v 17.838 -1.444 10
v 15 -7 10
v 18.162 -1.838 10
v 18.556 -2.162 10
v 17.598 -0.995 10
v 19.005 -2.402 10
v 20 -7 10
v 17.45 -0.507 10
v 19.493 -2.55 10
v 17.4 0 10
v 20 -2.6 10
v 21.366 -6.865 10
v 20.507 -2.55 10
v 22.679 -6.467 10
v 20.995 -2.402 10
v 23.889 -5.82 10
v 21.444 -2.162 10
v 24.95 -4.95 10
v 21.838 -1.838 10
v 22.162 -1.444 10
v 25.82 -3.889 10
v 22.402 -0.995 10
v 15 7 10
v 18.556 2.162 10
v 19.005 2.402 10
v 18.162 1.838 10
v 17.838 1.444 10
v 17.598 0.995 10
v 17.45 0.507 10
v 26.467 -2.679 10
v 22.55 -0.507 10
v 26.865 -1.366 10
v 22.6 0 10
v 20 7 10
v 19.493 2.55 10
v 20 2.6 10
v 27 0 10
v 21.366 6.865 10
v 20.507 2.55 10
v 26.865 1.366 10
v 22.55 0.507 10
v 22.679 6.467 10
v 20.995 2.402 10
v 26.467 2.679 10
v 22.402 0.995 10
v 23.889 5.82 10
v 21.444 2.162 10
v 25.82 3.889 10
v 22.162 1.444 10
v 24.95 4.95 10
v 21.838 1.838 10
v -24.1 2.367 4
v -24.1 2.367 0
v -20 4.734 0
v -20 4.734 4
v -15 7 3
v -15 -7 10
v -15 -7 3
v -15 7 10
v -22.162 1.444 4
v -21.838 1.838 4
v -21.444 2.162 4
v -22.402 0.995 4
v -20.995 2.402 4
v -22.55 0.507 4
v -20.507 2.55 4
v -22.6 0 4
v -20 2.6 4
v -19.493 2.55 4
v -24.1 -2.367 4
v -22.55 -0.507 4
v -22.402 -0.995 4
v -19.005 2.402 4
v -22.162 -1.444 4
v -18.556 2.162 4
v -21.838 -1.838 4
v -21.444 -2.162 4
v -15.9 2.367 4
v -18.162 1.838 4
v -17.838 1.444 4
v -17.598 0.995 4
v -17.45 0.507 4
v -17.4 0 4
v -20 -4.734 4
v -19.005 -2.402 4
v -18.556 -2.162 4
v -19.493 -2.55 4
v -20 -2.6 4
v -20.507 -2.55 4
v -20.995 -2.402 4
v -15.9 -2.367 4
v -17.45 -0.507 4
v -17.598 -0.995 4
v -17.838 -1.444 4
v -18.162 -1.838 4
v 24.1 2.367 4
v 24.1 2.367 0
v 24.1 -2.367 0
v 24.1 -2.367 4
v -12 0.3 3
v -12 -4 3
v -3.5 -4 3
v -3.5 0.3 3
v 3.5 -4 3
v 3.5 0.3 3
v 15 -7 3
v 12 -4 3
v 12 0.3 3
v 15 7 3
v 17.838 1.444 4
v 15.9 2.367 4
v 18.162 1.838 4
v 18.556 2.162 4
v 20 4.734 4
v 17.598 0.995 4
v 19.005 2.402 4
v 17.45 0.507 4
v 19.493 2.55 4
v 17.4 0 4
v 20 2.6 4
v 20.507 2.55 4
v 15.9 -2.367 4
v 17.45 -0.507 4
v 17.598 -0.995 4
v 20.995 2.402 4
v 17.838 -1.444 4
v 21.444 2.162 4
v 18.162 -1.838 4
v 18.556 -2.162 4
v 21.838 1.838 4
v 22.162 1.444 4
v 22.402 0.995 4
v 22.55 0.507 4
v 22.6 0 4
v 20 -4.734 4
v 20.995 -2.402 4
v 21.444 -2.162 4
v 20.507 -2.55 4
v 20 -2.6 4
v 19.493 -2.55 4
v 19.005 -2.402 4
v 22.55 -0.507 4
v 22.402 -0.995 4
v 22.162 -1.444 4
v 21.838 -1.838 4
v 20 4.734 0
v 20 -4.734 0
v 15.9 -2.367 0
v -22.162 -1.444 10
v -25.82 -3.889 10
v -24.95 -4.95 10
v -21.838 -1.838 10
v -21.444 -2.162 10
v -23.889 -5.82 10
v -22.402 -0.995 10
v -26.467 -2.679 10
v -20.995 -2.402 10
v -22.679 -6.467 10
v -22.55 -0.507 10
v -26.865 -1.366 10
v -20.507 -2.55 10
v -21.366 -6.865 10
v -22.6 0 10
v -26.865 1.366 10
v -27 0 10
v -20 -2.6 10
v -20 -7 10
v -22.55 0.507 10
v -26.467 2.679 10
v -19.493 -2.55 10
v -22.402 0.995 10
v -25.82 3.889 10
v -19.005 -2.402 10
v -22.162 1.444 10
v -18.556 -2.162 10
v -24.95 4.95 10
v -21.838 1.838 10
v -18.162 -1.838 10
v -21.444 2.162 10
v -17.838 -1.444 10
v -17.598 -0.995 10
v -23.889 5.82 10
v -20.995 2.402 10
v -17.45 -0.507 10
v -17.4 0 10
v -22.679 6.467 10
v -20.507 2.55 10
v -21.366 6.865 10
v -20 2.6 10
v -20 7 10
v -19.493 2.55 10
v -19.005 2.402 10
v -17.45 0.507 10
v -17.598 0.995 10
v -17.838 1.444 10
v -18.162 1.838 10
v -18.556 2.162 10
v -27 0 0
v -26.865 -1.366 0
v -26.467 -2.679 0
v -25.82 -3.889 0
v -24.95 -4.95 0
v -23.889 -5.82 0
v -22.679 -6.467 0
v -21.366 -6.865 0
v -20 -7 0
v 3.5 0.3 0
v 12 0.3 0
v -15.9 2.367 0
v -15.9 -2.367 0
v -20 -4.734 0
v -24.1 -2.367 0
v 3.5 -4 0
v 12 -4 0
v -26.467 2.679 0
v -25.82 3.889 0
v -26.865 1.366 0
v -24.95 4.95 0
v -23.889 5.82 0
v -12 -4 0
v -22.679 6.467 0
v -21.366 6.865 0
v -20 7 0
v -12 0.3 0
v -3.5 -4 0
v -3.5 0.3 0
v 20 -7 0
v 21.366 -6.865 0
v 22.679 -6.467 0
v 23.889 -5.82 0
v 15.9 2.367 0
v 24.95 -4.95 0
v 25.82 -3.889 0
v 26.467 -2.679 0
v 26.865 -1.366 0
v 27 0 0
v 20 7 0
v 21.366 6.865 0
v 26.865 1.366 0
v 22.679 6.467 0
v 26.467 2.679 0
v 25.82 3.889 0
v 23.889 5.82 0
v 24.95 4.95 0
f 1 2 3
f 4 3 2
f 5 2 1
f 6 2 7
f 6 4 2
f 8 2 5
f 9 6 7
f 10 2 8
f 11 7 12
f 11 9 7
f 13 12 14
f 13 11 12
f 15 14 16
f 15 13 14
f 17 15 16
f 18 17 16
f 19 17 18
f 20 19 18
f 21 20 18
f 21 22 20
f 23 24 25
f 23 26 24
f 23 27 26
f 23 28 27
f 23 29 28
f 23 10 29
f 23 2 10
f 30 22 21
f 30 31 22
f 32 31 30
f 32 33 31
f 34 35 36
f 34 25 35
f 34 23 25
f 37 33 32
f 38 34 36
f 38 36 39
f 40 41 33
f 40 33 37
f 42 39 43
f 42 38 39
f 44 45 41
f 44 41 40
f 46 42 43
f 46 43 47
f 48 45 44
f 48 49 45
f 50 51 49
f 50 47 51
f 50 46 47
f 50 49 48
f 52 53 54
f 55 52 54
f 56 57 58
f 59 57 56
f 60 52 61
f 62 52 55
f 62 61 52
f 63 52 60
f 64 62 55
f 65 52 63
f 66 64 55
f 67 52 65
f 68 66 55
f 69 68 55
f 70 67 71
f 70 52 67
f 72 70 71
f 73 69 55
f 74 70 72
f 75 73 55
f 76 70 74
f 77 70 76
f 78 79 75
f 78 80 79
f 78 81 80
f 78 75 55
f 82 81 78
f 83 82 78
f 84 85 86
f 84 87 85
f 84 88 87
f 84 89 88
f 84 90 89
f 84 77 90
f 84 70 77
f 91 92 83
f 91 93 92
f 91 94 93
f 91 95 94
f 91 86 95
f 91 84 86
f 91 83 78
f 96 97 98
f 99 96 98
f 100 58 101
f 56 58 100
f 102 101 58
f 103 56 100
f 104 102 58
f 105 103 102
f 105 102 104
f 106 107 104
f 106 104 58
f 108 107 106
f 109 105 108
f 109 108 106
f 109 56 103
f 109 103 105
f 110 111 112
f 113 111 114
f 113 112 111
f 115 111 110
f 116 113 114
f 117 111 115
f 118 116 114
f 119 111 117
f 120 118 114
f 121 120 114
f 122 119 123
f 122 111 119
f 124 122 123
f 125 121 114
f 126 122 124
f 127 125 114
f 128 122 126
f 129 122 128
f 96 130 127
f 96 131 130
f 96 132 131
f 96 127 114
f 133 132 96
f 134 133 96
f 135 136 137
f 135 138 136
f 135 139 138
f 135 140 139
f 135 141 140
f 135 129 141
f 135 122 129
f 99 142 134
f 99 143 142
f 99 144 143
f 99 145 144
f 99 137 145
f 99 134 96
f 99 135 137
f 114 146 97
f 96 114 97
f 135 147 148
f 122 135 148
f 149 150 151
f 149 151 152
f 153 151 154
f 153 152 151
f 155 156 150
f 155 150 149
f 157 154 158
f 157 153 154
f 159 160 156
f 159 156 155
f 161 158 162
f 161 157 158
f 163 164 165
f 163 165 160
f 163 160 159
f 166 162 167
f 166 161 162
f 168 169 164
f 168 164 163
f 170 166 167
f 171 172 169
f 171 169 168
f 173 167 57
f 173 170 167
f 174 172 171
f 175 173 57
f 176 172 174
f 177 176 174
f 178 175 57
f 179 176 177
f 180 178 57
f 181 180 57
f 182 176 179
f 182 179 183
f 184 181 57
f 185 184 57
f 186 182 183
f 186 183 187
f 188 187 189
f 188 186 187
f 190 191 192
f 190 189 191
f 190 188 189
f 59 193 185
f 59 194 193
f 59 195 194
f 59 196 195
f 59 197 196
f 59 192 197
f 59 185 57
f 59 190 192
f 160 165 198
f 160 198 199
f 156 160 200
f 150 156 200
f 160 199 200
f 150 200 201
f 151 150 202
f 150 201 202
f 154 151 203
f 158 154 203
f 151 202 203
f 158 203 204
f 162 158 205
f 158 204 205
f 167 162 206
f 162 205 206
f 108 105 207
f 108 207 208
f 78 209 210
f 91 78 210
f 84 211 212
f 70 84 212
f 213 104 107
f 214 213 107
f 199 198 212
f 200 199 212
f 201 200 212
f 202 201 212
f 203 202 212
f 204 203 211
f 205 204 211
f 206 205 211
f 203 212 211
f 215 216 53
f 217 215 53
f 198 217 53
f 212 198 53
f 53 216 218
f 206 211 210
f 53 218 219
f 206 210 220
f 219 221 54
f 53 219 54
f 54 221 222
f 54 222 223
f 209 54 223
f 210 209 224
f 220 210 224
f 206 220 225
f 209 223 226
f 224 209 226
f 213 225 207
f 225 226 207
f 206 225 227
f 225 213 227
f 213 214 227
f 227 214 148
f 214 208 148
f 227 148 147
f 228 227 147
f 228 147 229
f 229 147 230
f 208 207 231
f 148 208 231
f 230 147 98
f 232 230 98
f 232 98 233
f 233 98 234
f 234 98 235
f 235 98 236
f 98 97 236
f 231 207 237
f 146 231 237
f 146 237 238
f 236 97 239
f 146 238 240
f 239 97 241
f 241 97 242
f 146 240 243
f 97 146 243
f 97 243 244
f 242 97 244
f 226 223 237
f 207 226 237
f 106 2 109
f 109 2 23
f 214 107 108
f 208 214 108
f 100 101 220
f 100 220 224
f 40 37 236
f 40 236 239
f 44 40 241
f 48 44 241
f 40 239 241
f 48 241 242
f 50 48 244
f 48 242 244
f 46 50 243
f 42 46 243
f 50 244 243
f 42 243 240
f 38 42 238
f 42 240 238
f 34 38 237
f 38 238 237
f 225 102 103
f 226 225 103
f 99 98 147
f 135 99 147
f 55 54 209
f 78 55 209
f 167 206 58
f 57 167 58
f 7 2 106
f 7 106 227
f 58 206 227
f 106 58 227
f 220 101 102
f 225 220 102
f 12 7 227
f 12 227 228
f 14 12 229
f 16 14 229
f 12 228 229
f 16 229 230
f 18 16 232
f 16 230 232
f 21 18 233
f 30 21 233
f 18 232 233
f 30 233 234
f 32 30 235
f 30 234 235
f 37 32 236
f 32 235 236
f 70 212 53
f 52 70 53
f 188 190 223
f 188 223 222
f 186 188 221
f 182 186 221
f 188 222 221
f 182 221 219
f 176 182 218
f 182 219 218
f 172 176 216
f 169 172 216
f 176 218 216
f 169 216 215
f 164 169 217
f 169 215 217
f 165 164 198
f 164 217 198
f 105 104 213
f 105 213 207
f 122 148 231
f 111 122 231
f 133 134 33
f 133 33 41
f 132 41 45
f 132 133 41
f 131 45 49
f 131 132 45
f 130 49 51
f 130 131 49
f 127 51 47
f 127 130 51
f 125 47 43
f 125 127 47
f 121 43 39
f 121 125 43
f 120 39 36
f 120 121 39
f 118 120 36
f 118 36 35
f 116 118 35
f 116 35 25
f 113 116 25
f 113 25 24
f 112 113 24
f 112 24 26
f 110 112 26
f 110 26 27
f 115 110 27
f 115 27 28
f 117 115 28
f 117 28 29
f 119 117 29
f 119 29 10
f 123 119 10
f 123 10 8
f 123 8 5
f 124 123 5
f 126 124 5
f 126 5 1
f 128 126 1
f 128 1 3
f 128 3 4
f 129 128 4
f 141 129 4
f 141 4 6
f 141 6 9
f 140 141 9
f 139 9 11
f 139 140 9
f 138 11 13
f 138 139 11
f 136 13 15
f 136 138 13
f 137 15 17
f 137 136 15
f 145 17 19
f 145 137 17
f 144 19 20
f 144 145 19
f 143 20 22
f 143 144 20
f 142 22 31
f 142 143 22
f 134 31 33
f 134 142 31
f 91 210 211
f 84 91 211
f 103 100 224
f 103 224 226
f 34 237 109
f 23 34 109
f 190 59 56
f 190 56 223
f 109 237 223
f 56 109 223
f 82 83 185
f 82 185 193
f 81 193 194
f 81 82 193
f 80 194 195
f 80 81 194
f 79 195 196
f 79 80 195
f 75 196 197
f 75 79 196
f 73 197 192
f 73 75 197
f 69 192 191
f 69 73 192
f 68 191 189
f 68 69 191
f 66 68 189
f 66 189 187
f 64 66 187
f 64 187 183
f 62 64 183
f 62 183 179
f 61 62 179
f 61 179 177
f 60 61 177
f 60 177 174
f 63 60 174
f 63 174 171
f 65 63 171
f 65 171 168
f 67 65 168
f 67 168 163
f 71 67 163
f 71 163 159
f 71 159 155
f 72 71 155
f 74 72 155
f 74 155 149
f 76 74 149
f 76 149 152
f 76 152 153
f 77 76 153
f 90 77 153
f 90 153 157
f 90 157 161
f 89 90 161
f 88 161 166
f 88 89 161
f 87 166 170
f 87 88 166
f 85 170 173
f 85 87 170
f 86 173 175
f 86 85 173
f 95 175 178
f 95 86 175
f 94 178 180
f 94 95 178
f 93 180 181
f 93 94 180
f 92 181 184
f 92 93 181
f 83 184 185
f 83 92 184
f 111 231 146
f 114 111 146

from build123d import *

# Parameters (mm, degrees)
F0_R     = 2.6
F1_DEPTH = 10
F2_W     = 30
F2_H     = 14
F3_DEPTH = 7
F4_W     = 8.5
F4_H     = 4.3
F5_DEPTH = 25
F6_R     = 2.6
F7_DEPTH = 4


with BuildPart() as f1:
    # F0 (on Top) → F1 (new body)
    with BuildSketch(Plane.XY):
        with BuildLine():
            ThreePointArc((27, 0), (24.949747, 4.949747), (20, 7))
            Line((20, 7), (-20, 7))
            ThreePointArc((-20, 7), (-24.949747, 4.949747), (-27, 0))
            ThreePointArc((-27, 0), (-24.949747, -4.949747), (-20, -7))
            Line((-20, -7), (20, -7))
            ThreePointArc((20, -7), (24.949747, -4.949747), (27, 0))
        make_face()
        with Locations((-20, 0)):
            Circle(F0_R, mode=Mode.SUBTRACT)
        with Locations((20, 0)):
            Circle(F0_R, mode=Mode.SUBTRACT)
    extrude(amount=F1_DEPTH)

    # F2 (on face) → F3 (cut)
    with BuildSketch(Plane.XY.offset(10)):
        Rectangle(F2_W, F2_H)
    extrude(amount=-F3_DEPTH, mode=Mode.SUBTRACT)

    # F4 (on face) → F5 (cut)
    with BuildSketch(Plane.XY.offset(3)):
        with Locations((-7.75, -1.85)):
            Rectangle(F4_W, F4_H)
        with Locations((7.75, -1.85)):
            Rectangle(F4_W, F4_H)
    extrude(amount=-F5_DEPTH, mode=Mode.SUBTRACT)

    # F6 (on face) → F7 (cut)
    with BuildSketch(Plane(origin=(0, 0, 0), x_dir=(1, 0, 0), z_dir=(0, 0, -1))):
        Polygon((-15.9, -2.367136), (-15.9, 2.367136), (-20, 4.734272), (-24.1, 2.367136), (-24.1, -2.367136), (-20, -4.734272), align=None)
        with Locations((-20, 0)):
            Circle(F6_R, mode=Mode.SUBTRACT)
        Polygon((15.9, 2.367136), (15.9, -2.367136), (20, -4.734272), (24.1, -2.367136), (24.1, 2.367136), (20, 4.734272), align=None)
        with Locations((20, 0)):
            Circle(F6_R, mode=Mode.SUBTRACT)
    extrude(amount=-F7_DEPTH, mode=Mode.SUBTRACT)


solid = f1.part
